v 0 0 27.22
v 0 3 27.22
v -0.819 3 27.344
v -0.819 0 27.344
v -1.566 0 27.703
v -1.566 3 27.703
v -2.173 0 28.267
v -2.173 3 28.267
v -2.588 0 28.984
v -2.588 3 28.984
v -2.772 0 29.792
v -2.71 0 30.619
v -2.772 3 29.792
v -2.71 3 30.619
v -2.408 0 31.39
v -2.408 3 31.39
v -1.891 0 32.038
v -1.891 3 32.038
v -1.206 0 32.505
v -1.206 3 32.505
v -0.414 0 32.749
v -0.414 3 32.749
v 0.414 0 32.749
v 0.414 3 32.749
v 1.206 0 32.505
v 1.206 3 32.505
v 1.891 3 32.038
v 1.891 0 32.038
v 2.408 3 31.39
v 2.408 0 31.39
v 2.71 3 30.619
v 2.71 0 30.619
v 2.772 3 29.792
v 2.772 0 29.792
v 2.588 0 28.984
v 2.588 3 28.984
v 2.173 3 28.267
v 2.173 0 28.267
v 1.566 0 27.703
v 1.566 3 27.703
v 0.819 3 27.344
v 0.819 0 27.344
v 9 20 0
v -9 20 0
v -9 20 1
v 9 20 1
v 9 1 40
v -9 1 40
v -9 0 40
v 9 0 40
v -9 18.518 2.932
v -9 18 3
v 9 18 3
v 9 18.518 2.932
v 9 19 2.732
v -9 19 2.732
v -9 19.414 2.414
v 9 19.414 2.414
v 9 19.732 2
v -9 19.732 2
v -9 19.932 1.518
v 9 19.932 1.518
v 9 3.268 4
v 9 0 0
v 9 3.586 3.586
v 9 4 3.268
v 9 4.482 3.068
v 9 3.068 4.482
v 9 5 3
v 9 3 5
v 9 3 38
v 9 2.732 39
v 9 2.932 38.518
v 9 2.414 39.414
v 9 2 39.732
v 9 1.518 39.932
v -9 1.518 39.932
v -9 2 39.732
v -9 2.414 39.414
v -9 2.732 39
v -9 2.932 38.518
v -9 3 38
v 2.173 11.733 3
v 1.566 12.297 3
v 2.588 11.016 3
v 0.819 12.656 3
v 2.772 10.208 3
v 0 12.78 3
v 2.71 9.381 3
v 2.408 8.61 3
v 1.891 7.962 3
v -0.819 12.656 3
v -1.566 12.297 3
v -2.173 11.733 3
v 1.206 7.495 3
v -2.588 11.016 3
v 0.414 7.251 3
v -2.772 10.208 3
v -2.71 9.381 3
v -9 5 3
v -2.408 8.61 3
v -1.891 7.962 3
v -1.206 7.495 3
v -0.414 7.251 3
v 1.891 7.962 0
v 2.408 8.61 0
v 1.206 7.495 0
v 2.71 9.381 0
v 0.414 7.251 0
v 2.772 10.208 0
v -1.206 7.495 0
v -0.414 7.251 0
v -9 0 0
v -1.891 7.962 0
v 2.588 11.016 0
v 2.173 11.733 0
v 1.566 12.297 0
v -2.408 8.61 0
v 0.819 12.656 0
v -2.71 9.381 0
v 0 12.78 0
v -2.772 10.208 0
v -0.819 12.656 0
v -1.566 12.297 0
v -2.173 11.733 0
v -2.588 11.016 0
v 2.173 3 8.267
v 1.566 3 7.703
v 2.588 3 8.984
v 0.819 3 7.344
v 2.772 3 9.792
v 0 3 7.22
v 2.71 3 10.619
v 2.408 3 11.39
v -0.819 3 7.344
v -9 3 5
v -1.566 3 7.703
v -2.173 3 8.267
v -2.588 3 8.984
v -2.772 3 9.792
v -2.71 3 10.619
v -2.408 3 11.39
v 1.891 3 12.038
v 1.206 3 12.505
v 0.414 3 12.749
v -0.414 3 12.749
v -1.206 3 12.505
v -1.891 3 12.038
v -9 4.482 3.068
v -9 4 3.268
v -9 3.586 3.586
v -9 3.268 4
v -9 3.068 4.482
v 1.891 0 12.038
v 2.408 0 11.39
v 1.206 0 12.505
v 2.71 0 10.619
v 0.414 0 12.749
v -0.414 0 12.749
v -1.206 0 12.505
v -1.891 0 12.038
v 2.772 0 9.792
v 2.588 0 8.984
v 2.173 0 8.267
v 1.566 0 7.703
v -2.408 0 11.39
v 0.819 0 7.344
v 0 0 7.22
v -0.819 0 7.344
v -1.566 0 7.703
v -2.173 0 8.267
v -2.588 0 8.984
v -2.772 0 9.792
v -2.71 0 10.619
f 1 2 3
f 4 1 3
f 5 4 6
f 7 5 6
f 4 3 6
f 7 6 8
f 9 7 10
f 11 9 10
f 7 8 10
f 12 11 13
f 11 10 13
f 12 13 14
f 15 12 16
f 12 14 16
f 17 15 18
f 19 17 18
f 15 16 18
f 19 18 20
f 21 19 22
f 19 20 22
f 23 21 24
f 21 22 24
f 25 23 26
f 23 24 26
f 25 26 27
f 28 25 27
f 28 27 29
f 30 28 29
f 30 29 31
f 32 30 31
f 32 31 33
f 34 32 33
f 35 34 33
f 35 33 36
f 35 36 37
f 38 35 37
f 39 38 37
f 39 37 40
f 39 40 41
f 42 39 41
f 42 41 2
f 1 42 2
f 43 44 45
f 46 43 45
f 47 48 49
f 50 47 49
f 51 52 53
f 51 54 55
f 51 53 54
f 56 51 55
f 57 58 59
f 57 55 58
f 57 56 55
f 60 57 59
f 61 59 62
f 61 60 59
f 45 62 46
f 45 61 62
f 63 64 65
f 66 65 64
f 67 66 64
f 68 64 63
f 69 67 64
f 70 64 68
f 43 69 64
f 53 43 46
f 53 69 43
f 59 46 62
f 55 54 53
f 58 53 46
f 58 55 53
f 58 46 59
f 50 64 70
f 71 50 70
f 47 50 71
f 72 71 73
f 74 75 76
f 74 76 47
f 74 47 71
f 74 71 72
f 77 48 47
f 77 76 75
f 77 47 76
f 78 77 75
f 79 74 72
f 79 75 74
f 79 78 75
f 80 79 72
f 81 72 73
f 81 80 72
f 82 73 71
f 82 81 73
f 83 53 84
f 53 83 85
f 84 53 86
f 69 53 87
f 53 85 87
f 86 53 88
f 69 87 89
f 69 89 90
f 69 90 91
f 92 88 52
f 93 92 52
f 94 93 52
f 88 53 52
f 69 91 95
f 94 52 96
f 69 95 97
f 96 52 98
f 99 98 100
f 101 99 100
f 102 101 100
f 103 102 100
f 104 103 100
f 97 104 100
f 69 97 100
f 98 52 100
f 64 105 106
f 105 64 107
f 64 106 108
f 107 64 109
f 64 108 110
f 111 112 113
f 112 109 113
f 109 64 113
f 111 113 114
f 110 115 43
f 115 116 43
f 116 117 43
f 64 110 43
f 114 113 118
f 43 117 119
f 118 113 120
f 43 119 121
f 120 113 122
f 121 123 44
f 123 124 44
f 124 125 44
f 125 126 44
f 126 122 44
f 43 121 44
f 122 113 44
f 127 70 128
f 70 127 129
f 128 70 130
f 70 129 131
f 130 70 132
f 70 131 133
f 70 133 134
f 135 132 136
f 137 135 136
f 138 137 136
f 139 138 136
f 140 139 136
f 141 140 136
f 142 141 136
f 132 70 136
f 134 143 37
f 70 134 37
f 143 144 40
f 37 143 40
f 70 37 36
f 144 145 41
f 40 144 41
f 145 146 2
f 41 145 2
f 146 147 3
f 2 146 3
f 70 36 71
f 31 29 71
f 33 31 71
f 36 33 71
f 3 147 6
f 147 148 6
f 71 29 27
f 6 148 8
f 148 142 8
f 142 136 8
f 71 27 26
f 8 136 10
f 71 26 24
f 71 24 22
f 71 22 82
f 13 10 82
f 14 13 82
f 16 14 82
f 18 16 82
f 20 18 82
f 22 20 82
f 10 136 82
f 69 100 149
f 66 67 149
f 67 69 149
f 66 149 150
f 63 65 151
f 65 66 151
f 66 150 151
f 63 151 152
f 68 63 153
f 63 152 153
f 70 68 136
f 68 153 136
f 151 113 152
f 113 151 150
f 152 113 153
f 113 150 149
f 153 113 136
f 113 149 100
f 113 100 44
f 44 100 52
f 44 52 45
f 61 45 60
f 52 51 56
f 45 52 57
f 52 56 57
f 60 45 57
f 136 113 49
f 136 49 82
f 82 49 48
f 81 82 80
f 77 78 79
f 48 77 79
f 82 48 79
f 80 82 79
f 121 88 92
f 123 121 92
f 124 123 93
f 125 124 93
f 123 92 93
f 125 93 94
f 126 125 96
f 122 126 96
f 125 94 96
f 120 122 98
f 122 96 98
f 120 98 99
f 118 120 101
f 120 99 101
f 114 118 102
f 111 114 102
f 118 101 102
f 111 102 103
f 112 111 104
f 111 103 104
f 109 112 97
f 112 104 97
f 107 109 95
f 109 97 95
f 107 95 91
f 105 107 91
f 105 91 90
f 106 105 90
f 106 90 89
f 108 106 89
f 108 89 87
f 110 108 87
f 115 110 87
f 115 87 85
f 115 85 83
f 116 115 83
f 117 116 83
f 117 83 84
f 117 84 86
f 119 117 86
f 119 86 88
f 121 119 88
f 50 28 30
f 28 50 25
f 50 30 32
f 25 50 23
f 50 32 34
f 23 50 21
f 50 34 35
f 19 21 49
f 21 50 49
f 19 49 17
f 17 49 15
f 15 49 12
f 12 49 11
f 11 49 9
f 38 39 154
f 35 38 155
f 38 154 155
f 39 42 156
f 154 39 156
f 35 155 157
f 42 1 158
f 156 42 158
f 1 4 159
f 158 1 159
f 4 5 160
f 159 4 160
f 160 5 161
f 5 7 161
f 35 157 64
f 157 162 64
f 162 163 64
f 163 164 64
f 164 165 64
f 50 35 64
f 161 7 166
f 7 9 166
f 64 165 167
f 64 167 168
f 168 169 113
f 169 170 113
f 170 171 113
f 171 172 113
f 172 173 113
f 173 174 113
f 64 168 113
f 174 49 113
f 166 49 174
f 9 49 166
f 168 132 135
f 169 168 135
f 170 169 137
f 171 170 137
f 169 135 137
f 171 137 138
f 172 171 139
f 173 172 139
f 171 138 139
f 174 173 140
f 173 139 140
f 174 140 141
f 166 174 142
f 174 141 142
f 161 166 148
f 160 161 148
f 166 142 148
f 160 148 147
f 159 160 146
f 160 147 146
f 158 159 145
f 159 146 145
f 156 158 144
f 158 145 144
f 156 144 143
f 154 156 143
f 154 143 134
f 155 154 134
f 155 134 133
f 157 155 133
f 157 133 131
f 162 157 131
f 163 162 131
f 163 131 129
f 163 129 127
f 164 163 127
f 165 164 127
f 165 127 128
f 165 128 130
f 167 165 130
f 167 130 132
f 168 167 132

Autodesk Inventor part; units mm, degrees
ref_plane "YZ Plane" through (0, 0, 0) normal (1, 0, 0) x (0, 1, 0)
ref_plane "XZ Plane" through (0, 0, 0) normal (0, 1, 0) x (-1, 0, 0)
ref_plane "XY Plane" through (0, 0, 0) normal (0, 0, 1) x (1, 0, 0)
sketch "Sketch_1" plane through (0, 0, 0) normal (1, 0, 0) x (0, 1, 0)
  line L0 (1, 40) -> (0, 40)
  line L1 (0, 40) -> (0, 0)
  line L2 (0, 0) -> (20, 0)
  line L3 (20, 0) -> (20, 1)
  arc A0 (20, 1) -> (18, 3) centre (18, 1) ccw
  line L4 (18, 3) -> (5, 3)
  arc A1 (3, 5) -> (5, 3) centre (5, 5) ccw
  line L5 (3, 5) -> (3, 38)
  arc A2 (3, 38) -> (1, 40) centre (1, 38) ccw
extrude "Extrusion1" add sketch "Sketch_1" along normal mid plane 18
sketch "Sketch2" plane through (9, 20, 0) normal (0, 0, -1) x (-1, 0, 0)
  point P0 (9, -10)
hole "Hole1" at (0, 10, 0) direction (0, 0, 1) diameter 5.56 depth 3
sketch "Sketch3" plane through (-9, 0, 0) normal (0, -1, 0) x (1, 0, 0)
  point P0 (9, 10)
hole "Hole2" at (0, 0, 10) direction (0, 1, 0) diameter 5.56 depth 3
sketch "Sketch4" plane through (-9, 0, 0) normal (0, -1, 0) x (1, 0, 0)
  point P0 (9, 30)
hole "Hole3" at (0, 0, 30) direction (0, 1, 0) diameter 5.56 depth 3
properties part number "20-4176 Aluminum"
